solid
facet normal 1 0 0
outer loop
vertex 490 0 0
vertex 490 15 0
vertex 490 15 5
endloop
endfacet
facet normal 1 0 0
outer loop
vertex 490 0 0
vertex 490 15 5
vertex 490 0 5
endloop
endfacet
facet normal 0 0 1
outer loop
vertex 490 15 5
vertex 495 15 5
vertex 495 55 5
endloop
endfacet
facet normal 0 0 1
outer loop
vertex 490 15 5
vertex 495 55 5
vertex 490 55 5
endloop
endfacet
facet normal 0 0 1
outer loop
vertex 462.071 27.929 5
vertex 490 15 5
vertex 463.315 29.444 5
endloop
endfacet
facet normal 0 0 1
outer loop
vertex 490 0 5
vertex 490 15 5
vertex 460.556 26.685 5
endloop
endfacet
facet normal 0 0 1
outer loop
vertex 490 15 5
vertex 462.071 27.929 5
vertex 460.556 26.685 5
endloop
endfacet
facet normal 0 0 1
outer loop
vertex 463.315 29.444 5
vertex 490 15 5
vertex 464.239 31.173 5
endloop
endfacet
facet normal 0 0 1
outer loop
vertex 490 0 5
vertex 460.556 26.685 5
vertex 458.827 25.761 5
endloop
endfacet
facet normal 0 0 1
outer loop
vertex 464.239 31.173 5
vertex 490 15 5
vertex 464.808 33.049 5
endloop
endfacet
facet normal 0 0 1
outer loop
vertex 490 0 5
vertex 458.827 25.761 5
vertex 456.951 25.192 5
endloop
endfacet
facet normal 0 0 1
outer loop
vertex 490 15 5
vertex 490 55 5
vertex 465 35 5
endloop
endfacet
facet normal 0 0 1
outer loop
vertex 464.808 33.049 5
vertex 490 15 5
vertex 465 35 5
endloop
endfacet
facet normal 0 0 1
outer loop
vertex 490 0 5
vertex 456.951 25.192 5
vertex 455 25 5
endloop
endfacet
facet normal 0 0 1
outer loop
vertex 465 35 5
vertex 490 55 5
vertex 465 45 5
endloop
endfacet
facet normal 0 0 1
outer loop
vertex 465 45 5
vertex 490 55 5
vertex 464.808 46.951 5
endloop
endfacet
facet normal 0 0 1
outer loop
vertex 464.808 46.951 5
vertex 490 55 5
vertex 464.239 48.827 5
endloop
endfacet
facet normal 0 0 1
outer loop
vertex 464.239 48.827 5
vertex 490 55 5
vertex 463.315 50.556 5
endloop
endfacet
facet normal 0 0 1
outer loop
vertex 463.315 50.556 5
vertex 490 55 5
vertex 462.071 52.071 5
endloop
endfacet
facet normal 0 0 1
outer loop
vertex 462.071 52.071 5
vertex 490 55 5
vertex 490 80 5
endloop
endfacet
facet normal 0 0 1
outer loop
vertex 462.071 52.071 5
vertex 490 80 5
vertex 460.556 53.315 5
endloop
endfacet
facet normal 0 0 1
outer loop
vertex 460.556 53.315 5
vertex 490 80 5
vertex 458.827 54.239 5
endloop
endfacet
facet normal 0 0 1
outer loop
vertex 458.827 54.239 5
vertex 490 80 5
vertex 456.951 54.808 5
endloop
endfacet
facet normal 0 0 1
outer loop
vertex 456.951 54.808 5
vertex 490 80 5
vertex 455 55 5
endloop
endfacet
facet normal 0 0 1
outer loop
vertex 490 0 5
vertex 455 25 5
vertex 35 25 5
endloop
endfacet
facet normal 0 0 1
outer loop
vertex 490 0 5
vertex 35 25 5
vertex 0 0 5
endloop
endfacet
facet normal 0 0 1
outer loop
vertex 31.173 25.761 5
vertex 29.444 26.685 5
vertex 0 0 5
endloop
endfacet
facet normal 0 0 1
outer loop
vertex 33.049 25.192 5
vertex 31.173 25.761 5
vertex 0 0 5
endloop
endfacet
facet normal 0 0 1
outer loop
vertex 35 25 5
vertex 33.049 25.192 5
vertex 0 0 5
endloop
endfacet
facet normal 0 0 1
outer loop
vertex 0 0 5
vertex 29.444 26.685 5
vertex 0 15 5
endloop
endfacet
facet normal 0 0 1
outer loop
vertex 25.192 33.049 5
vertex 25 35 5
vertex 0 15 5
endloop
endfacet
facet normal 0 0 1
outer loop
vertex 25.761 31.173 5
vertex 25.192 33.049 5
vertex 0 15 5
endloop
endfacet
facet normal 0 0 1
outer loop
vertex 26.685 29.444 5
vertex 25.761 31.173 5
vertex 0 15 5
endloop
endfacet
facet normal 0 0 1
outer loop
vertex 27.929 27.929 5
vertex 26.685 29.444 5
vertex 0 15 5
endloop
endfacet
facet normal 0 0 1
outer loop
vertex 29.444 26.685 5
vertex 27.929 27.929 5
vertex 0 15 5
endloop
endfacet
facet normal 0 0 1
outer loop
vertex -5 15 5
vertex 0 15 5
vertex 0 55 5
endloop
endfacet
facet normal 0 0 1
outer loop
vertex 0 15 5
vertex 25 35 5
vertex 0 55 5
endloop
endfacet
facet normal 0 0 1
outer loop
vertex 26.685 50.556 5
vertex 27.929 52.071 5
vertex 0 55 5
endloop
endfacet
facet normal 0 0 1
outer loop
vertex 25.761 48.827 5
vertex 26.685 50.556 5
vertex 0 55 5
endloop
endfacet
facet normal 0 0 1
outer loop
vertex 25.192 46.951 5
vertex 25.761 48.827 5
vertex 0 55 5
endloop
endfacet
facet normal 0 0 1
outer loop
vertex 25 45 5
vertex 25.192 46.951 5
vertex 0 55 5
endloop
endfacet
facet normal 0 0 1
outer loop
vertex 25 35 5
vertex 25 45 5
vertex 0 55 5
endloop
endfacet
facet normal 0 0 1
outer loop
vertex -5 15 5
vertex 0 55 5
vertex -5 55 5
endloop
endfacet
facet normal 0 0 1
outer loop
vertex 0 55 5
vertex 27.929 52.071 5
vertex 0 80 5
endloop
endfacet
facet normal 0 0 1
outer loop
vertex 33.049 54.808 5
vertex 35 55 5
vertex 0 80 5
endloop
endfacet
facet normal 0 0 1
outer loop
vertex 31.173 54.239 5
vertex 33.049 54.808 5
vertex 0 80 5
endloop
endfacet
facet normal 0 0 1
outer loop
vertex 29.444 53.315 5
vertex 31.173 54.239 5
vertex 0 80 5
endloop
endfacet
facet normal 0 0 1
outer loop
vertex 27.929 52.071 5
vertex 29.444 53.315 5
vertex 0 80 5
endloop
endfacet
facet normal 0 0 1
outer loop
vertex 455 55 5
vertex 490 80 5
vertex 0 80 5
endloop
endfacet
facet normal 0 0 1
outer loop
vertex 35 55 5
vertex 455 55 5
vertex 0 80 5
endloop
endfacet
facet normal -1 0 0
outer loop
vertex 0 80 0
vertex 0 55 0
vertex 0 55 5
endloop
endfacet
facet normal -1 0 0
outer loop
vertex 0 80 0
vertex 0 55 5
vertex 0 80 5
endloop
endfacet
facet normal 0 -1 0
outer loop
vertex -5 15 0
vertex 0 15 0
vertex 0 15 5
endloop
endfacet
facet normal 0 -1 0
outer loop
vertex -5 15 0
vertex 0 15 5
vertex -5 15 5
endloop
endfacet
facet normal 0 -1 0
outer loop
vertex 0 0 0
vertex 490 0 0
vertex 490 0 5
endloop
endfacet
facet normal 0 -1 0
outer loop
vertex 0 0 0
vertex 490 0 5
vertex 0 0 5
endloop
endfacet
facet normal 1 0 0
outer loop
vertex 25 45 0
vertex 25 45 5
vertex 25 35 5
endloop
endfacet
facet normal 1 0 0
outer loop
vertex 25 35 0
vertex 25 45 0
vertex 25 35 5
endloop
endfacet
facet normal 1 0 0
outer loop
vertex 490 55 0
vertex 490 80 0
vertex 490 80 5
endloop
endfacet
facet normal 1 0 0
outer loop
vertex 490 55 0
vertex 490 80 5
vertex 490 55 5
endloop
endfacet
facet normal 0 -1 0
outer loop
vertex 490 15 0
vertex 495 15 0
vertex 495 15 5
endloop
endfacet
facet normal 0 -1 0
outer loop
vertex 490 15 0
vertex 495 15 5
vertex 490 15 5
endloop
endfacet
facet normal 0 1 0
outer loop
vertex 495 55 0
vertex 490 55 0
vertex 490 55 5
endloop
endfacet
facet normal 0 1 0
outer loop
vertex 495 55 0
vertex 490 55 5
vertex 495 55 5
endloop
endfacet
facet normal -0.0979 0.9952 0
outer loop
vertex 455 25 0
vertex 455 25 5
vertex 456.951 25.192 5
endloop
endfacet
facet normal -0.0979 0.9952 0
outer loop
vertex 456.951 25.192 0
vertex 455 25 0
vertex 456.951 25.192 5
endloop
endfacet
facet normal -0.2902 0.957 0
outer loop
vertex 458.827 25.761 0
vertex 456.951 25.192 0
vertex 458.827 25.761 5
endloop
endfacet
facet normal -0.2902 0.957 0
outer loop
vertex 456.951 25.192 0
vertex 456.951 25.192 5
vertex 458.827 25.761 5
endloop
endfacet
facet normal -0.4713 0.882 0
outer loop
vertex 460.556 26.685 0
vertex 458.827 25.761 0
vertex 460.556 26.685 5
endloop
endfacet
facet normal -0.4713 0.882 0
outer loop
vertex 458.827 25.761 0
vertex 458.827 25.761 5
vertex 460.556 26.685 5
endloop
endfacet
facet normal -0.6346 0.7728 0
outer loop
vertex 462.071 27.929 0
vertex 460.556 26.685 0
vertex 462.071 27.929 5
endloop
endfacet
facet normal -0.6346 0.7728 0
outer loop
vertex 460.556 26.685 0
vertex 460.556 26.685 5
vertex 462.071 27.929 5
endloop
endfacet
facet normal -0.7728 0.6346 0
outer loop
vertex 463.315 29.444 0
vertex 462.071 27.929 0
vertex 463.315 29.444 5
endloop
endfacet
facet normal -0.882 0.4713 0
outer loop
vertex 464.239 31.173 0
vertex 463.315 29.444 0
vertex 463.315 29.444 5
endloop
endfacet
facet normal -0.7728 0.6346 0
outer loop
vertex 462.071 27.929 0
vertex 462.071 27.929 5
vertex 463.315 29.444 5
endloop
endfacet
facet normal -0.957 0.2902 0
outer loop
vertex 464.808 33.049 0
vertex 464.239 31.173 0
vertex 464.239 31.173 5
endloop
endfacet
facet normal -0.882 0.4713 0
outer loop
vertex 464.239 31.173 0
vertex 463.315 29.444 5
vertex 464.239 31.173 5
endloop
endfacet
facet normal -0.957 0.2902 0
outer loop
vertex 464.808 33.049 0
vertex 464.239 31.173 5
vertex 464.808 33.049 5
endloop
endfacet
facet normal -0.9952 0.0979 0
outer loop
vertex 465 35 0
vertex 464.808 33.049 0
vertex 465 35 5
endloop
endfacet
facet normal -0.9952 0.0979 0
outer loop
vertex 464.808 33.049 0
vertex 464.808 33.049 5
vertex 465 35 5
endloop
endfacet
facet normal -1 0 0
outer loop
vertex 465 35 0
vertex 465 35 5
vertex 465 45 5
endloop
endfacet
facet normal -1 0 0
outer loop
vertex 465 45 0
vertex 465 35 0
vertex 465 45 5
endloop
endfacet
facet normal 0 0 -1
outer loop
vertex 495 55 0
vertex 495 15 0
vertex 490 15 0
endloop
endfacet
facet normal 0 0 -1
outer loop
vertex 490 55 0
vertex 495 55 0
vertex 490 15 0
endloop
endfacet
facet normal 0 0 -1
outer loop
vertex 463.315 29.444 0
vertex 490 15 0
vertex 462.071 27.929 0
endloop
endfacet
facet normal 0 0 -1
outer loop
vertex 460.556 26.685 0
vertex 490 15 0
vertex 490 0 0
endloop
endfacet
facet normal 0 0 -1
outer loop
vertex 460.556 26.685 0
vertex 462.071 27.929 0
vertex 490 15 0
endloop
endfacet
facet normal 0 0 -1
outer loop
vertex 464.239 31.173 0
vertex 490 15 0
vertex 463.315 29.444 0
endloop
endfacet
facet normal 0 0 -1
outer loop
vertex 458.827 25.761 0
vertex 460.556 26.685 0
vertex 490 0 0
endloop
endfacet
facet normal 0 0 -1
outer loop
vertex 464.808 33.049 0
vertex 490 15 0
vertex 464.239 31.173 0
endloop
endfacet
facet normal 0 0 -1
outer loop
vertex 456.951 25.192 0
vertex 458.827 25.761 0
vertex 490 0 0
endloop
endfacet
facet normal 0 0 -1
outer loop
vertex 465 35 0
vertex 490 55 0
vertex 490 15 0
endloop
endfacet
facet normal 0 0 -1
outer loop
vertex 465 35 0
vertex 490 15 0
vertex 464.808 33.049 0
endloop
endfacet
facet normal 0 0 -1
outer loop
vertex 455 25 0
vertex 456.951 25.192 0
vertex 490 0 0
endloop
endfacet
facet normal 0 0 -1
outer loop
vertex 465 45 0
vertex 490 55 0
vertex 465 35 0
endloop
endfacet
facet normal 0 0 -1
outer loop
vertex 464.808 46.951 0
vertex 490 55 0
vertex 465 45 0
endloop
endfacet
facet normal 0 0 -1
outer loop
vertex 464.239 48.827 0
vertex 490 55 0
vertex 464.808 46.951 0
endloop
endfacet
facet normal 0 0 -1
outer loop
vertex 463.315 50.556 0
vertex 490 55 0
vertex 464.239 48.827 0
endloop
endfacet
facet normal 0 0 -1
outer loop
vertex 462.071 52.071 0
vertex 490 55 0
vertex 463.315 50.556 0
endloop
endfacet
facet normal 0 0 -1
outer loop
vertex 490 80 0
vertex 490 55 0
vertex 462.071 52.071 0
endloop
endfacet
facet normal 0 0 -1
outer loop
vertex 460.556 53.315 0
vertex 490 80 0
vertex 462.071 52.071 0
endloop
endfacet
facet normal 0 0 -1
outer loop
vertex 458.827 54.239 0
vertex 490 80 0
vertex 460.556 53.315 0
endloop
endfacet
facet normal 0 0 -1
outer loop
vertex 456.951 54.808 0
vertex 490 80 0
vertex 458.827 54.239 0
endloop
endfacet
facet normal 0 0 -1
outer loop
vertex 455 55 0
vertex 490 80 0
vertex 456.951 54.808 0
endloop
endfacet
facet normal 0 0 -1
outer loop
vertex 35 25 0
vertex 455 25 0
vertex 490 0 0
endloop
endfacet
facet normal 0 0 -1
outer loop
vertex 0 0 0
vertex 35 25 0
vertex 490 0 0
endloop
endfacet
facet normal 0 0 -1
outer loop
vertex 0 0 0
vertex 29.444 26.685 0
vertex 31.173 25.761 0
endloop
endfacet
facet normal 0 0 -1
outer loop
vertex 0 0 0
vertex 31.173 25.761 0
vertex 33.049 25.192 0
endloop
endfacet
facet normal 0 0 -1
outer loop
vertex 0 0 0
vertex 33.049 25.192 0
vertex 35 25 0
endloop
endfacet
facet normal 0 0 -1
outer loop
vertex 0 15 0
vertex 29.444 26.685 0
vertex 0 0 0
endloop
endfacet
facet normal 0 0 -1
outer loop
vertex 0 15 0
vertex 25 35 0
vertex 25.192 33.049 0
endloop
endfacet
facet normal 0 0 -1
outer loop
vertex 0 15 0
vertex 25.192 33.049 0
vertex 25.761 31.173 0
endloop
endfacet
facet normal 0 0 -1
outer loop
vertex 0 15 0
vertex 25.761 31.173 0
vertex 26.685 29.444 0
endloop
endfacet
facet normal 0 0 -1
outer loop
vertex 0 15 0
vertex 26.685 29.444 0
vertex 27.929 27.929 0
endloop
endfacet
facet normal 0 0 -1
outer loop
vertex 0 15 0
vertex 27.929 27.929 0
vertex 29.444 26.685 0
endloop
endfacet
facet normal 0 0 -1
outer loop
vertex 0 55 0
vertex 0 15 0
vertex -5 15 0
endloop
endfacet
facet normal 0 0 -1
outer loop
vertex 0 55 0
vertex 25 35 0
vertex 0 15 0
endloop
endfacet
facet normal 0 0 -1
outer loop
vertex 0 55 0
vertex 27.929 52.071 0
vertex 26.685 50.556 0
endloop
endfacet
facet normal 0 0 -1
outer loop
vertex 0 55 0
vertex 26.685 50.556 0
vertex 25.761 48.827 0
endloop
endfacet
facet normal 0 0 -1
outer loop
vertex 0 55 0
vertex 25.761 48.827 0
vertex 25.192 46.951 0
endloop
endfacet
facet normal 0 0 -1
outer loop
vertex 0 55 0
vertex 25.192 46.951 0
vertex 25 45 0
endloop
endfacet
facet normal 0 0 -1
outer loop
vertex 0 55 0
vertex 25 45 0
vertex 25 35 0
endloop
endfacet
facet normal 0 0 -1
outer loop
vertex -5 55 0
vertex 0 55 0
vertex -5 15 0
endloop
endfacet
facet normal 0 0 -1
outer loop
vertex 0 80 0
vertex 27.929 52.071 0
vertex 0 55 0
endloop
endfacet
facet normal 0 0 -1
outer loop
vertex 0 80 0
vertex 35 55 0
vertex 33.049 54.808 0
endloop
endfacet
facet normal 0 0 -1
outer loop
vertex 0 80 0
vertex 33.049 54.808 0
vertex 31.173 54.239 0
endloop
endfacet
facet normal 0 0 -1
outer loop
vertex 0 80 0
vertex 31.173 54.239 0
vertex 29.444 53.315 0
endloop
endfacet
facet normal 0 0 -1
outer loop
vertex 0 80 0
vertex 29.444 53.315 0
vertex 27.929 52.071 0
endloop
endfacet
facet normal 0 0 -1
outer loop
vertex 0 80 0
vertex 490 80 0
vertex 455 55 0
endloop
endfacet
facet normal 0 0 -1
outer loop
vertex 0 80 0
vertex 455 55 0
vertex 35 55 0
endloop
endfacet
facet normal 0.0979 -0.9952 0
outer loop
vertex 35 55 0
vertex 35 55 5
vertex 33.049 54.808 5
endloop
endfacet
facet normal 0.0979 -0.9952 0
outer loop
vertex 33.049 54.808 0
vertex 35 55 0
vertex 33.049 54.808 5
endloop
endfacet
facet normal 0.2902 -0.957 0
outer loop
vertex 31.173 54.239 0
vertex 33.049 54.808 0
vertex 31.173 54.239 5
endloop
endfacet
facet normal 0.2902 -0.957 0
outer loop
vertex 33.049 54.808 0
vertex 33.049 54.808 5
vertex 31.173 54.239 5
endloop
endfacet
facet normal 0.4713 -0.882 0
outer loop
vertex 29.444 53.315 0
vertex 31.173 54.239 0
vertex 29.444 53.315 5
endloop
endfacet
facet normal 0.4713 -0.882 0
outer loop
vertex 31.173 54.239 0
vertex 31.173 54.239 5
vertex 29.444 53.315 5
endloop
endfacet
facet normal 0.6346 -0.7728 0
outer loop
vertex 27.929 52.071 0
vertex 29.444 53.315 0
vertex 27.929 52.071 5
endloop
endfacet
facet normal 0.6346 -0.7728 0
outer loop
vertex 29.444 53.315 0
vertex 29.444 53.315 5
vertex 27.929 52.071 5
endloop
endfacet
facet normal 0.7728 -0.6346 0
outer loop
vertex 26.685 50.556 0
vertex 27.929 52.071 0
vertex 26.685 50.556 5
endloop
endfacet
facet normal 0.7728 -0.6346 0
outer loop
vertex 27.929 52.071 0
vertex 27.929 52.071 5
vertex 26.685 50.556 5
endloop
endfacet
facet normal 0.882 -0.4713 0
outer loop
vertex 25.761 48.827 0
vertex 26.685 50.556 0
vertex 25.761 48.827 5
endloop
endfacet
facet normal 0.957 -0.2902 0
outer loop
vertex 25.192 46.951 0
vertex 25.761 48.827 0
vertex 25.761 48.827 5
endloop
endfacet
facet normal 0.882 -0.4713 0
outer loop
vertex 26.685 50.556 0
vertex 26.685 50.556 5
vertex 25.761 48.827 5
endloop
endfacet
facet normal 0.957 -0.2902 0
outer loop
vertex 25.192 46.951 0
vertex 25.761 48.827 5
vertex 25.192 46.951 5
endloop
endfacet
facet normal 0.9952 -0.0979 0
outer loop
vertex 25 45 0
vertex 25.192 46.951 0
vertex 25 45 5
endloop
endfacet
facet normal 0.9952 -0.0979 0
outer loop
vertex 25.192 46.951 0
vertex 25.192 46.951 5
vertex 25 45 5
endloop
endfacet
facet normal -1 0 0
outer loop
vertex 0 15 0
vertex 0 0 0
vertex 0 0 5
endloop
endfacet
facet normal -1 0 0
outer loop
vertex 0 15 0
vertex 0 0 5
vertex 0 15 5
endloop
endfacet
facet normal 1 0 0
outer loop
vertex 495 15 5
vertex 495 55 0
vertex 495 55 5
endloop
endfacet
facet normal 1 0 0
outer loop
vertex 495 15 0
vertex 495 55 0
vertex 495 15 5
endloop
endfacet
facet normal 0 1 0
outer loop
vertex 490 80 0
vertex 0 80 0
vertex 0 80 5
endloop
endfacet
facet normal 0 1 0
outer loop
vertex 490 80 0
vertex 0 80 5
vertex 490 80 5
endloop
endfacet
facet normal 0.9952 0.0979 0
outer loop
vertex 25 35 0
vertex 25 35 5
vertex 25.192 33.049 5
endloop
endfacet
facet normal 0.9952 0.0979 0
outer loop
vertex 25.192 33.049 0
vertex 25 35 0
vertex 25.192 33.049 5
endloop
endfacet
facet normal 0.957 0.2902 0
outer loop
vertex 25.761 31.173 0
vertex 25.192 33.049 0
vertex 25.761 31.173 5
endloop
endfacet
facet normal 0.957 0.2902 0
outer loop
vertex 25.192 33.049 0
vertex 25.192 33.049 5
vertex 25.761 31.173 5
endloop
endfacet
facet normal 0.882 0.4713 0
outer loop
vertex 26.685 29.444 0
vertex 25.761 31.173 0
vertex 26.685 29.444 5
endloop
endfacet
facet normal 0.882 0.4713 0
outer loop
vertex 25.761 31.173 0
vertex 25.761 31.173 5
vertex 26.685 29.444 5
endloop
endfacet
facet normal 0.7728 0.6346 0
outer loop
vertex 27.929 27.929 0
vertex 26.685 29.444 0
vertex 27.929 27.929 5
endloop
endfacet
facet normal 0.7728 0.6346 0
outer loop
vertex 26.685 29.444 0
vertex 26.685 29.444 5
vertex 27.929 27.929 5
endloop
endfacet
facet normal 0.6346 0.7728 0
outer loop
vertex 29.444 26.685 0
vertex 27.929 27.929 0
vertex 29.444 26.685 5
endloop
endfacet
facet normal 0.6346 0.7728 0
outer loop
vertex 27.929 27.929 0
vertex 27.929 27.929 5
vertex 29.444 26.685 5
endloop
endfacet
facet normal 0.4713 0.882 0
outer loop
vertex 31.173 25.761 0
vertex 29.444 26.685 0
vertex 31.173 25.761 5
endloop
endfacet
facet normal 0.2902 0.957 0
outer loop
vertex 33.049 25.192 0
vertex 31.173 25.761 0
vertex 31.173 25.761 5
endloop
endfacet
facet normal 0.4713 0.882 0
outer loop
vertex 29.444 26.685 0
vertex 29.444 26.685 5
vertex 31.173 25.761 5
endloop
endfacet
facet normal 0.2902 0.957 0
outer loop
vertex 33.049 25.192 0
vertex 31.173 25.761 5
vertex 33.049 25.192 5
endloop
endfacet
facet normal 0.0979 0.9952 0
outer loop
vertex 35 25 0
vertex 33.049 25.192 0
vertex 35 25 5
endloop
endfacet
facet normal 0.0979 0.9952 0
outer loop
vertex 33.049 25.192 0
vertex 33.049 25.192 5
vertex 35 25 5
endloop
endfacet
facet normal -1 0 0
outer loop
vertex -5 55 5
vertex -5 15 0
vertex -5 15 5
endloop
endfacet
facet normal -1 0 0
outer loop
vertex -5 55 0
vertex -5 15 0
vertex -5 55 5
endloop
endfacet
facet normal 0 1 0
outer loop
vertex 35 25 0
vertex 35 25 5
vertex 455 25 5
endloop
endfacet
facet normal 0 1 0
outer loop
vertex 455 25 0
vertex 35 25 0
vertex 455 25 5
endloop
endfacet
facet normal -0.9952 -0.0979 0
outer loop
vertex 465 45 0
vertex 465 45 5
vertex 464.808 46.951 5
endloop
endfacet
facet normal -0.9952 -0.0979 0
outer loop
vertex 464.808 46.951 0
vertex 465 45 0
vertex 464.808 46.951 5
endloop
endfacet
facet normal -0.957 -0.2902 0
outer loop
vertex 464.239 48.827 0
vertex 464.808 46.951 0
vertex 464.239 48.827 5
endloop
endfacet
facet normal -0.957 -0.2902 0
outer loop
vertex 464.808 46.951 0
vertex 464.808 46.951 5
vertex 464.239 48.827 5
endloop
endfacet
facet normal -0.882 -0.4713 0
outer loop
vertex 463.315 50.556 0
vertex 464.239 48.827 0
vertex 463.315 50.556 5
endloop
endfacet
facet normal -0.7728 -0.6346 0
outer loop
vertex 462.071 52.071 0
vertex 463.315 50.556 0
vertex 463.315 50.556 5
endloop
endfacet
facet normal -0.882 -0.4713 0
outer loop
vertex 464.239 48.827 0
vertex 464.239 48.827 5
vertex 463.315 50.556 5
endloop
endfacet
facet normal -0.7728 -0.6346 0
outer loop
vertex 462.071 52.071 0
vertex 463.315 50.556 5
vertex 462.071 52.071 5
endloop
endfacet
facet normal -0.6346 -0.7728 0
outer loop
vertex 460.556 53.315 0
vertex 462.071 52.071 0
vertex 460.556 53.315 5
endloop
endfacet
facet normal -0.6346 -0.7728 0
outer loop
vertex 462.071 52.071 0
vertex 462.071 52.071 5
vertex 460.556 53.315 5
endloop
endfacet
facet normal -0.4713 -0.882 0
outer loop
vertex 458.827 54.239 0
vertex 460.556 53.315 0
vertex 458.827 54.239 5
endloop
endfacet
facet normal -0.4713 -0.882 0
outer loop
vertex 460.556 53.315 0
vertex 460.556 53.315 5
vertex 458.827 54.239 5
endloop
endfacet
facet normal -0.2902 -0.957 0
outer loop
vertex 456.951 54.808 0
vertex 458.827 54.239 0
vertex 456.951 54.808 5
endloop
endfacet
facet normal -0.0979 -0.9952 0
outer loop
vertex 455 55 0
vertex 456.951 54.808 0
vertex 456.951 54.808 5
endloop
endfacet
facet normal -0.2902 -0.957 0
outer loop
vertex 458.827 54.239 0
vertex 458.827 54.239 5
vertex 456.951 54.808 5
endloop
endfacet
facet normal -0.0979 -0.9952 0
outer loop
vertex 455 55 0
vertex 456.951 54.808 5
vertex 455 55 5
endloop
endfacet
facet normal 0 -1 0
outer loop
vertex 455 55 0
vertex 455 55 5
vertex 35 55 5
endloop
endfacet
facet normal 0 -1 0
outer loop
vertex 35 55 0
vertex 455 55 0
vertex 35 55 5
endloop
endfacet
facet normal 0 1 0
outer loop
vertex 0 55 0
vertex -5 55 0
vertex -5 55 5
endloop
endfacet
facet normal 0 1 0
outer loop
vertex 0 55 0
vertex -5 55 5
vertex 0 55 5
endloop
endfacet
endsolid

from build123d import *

# Parameters (mm, degrees)
BOSS_EXTRU_1_DEPTH      = 5
ENL_V_MAT_EXTRU_1_REACH = 7


with BuildPart() as part:
    # Esquisse1 → Boss.-Extru.1 (new body)
    with BuildSketch(Plane.XY):
        Polygon((0, 0), (0, 15), (-5, 15), (-5, 55), (0, 55), (0, 80), (490, 80), (490, 55), (495, 55), (495, 15), (490, 15), (490, 0), align=None)
    extrude(amount=BOSS_EXTRU_1_DEPTH)

    # Esquisse2 → Enlèv. mat.-Extru.1 (cut, up to next)
    with BuildSketch(Plane.XY.offset(5), mode=Mode.PRIVATE) as enl_v_mat_extru_1_sk1:
        with BuildLine():
            Line((35, 25), (455, 25))
            ThreePointArc((455, 25), (462.071067812, 27.928932188), (465, 35))
            Line((465, 35), (465, 45))
            ThreePointArc((465, 45), (462.071067812, 52.071067812), (455, 55))
            Line((455, 55), (35, 55))
            ThreePointArc((35, 55), (27.928932188, 52.071067812), (25, 45))
            Line((25, 45), (25, 35))
            ThreePointArc((25, 35), (27.928932188, 27.928932188), (35, 25))
        make_face()
    enl_v_mat_extru_1_tool1 = extrude(enl_v_mat_extru_1_sk1.sketch, amount=-ENL_V_MAT_EXTRU_1_REACH, mode=Mode.PRIVATE) & part.part
    add(enl_v_mat_extru_1_tool1.solids().sort_by_distance((245, 40, 5))[0], mode=Mode.SUBTRACT)


solid = part.part
